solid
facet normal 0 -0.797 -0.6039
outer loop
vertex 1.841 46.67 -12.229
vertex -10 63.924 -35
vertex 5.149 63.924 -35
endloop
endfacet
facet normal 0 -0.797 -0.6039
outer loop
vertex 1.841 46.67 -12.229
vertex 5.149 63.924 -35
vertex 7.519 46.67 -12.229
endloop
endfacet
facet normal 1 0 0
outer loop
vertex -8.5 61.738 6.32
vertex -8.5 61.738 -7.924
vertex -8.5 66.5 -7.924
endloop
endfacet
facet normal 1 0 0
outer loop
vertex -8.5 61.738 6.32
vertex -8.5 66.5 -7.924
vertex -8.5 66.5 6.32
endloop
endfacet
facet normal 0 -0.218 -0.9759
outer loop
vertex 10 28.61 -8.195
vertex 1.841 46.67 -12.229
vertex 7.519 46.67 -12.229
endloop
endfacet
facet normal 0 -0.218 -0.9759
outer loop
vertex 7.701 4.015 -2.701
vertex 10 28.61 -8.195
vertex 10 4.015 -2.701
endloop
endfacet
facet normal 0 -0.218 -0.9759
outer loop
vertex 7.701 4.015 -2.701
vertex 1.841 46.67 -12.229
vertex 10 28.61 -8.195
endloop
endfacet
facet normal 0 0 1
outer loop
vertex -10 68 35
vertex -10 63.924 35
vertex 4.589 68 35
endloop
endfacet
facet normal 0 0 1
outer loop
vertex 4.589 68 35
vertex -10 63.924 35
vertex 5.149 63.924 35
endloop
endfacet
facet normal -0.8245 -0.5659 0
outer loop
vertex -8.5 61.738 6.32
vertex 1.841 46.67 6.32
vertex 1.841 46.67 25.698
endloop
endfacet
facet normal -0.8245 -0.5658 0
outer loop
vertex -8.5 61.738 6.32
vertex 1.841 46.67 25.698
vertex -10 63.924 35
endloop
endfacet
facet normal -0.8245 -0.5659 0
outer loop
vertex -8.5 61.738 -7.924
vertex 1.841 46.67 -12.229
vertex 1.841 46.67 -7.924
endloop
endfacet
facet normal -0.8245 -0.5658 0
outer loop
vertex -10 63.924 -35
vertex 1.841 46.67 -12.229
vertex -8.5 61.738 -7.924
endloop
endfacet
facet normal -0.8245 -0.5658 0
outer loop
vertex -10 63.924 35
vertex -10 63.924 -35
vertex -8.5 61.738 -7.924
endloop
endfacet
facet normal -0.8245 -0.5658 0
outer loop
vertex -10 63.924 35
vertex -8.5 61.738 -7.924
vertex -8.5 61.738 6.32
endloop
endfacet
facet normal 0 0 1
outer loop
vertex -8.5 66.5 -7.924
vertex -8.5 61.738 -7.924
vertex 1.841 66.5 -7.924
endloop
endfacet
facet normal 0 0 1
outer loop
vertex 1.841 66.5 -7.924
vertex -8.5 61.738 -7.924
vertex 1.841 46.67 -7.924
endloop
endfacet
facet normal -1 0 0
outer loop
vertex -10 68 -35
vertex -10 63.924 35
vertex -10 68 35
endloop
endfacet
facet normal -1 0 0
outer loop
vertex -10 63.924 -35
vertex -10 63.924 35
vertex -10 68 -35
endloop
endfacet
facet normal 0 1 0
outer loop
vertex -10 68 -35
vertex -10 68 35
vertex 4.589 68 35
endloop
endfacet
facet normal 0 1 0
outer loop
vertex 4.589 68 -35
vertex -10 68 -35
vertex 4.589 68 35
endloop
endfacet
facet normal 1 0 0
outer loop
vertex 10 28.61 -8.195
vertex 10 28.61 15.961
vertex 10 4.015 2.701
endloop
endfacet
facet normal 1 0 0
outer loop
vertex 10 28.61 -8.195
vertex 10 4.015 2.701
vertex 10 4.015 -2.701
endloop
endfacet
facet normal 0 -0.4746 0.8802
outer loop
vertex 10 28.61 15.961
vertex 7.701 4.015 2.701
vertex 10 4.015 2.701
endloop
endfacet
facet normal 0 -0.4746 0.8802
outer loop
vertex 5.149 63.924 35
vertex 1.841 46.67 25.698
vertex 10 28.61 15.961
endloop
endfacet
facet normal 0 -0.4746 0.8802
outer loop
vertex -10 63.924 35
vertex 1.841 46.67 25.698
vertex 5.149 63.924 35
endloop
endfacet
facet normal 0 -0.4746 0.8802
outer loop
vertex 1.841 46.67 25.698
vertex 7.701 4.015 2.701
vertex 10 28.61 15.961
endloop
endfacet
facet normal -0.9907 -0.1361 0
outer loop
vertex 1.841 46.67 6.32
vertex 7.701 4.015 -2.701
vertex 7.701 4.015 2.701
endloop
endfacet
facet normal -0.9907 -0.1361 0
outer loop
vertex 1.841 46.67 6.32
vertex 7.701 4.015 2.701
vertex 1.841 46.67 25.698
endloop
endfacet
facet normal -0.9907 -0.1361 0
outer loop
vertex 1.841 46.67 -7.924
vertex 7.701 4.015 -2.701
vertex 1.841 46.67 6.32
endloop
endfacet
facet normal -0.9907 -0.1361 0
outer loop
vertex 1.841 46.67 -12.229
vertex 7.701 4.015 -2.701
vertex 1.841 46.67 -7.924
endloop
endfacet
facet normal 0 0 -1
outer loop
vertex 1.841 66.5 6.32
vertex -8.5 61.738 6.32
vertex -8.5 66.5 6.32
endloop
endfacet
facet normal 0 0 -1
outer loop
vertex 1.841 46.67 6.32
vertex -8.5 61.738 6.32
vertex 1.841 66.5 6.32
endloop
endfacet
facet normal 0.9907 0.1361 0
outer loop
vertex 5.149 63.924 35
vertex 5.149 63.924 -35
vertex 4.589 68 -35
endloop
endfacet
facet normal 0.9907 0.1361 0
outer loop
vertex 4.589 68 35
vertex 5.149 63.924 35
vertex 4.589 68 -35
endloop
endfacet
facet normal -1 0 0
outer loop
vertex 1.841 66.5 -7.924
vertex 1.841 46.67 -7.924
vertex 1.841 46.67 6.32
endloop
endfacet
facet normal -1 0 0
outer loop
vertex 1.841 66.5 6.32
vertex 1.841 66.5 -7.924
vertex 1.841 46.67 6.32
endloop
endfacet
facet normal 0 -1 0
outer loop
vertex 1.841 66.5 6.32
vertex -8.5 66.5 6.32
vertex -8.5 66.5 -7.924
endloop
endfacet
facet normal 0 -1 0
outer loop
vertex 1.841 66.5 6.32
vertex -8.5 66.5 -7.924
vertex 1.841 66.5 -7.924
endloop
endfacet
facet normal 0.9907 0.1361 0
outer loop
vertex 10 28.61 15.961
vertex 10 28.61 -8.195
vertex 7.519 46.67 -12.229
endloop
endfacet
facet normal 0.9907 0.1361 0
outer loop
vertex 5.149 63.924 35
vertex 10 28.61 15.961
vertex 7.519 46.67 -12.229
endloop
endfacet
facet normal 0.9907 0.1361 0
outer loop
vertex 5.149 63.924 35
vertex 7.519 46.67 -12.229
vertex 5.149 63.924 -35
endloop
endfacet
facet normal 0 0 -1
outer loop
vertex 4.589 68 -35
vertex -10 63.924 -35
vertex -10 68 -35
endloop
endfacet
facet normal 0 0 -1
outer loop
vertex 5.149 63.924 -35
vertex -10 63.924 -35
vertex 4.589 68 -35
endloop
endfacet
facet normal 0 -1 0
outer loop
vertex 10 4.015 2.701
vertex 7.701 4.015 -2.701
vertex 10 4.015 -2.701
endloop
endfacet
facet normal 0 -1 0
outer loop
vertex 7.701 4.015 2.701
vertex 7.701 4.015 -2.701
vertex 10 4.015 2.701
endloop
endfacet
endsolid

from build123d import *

# Parameters (mm, degrees)
SKETCH_1_W               = 20
SKETCH_1_H               = 70
EXTRUDE_1_DEPTH          = 68
SKETCH_2_W               = 10.341057985
SKETCH_2_H               = 14.244474777
CUT_EXTRUDE_1_DEPTH      = 66.5
CUT_EXTRUDE_2_DEPTH      = 27
CUT_EXTRUDE_2_DEPTH_BACK = 28.5
CUT_EXTRUDE_3_DEPTH      = 18
CUT_EXTRUDE_3_DEPTH_BACK = 80.5


with BuildPart() as part:
    # 草图1 → 凸台-拉伸1 (new body)
    with BuildSketch(Plane(origin=(0, 0, 0), x_dir=(1, 0, 0), z_dir=(0, 1, 0))):
        Rectangle(SKETCH_1_W, SKETCH_1_H)
    extrude(amount=EXTRUDE_1_DEPTH)

    # 草图2 → 切除-拉伸1 (cut)
    with BuildSketch(Plane.XZ):
        with Locations((-3.329471008, -0.802163256)):
            Rectangle(SKETCH_2_W, SKETCH_2_H)
    extrude(amount=-CUT_EXTRUDE_1_DEPTH, mode=Mode.SUBTRACT)

    # 草图3 → 切除-拉伸2 (cut, two sides)
    with BuildSketch(Plane.ZY.offset(10)) as cut_extrude_2_sk:
        Polygon((-35, 68), (-35, 63.923584322), (-12.228951857, 46.66952319), (-2.701261913, 4.015150281), (2.701261913, 4.015150281), (35, 63.923584322), (35, 68), (43.781903243, 68), (43.781903243, -5.043476458), (-39.089851198, -5.043476458), (-39.089851198, 68), align=None)
    extrude(amount=CUT_EXTRUDE_2_DEPTH, mode=Mode.SUBTRACT)
    extrude(cut_extrude_2_sk.sketch, amount=-CUT_EXTRUDE_2_DEPTH_BACK, mode=Mode.SUBTRACT)

    # 草图4 → 切除-拉伸3 (cut, two sides)
    with BuildSketch(Plane(origin=(0, 0, -35), x_dir=(-1, 0, 0), z_dir=(0, 0, -1))) as cut_extrude_3_sk:
        Polygon((-10, 28.610295414), (-5.14861474, 63.923584322), (-10, 63.923584322), align=None)
        Polygon((-5.14861474, 63.923584322), (-4.588591487, 68), (-10, 68), (-10, 63.923584322), align=None)
        Polygon((-7.700970851, -1.077719905), (-7.700970851, 4.015150281), (-1.841057985, 46.66952319), (10, 63.923584322), (16.463180064, 63.923584322), (16.463180064, -1.077719905), align=None)
    extrude(amount=CUT_EXTRUDE_3_DEPTH, mode=Mode.SUBTRACT)
    extrude(cut_extrude_3_sk.sketch, amount=-CUT_EXTRUDE_3_DEPTH_BACK, mode=Mode.SUBTRACT)


solid = part.part
